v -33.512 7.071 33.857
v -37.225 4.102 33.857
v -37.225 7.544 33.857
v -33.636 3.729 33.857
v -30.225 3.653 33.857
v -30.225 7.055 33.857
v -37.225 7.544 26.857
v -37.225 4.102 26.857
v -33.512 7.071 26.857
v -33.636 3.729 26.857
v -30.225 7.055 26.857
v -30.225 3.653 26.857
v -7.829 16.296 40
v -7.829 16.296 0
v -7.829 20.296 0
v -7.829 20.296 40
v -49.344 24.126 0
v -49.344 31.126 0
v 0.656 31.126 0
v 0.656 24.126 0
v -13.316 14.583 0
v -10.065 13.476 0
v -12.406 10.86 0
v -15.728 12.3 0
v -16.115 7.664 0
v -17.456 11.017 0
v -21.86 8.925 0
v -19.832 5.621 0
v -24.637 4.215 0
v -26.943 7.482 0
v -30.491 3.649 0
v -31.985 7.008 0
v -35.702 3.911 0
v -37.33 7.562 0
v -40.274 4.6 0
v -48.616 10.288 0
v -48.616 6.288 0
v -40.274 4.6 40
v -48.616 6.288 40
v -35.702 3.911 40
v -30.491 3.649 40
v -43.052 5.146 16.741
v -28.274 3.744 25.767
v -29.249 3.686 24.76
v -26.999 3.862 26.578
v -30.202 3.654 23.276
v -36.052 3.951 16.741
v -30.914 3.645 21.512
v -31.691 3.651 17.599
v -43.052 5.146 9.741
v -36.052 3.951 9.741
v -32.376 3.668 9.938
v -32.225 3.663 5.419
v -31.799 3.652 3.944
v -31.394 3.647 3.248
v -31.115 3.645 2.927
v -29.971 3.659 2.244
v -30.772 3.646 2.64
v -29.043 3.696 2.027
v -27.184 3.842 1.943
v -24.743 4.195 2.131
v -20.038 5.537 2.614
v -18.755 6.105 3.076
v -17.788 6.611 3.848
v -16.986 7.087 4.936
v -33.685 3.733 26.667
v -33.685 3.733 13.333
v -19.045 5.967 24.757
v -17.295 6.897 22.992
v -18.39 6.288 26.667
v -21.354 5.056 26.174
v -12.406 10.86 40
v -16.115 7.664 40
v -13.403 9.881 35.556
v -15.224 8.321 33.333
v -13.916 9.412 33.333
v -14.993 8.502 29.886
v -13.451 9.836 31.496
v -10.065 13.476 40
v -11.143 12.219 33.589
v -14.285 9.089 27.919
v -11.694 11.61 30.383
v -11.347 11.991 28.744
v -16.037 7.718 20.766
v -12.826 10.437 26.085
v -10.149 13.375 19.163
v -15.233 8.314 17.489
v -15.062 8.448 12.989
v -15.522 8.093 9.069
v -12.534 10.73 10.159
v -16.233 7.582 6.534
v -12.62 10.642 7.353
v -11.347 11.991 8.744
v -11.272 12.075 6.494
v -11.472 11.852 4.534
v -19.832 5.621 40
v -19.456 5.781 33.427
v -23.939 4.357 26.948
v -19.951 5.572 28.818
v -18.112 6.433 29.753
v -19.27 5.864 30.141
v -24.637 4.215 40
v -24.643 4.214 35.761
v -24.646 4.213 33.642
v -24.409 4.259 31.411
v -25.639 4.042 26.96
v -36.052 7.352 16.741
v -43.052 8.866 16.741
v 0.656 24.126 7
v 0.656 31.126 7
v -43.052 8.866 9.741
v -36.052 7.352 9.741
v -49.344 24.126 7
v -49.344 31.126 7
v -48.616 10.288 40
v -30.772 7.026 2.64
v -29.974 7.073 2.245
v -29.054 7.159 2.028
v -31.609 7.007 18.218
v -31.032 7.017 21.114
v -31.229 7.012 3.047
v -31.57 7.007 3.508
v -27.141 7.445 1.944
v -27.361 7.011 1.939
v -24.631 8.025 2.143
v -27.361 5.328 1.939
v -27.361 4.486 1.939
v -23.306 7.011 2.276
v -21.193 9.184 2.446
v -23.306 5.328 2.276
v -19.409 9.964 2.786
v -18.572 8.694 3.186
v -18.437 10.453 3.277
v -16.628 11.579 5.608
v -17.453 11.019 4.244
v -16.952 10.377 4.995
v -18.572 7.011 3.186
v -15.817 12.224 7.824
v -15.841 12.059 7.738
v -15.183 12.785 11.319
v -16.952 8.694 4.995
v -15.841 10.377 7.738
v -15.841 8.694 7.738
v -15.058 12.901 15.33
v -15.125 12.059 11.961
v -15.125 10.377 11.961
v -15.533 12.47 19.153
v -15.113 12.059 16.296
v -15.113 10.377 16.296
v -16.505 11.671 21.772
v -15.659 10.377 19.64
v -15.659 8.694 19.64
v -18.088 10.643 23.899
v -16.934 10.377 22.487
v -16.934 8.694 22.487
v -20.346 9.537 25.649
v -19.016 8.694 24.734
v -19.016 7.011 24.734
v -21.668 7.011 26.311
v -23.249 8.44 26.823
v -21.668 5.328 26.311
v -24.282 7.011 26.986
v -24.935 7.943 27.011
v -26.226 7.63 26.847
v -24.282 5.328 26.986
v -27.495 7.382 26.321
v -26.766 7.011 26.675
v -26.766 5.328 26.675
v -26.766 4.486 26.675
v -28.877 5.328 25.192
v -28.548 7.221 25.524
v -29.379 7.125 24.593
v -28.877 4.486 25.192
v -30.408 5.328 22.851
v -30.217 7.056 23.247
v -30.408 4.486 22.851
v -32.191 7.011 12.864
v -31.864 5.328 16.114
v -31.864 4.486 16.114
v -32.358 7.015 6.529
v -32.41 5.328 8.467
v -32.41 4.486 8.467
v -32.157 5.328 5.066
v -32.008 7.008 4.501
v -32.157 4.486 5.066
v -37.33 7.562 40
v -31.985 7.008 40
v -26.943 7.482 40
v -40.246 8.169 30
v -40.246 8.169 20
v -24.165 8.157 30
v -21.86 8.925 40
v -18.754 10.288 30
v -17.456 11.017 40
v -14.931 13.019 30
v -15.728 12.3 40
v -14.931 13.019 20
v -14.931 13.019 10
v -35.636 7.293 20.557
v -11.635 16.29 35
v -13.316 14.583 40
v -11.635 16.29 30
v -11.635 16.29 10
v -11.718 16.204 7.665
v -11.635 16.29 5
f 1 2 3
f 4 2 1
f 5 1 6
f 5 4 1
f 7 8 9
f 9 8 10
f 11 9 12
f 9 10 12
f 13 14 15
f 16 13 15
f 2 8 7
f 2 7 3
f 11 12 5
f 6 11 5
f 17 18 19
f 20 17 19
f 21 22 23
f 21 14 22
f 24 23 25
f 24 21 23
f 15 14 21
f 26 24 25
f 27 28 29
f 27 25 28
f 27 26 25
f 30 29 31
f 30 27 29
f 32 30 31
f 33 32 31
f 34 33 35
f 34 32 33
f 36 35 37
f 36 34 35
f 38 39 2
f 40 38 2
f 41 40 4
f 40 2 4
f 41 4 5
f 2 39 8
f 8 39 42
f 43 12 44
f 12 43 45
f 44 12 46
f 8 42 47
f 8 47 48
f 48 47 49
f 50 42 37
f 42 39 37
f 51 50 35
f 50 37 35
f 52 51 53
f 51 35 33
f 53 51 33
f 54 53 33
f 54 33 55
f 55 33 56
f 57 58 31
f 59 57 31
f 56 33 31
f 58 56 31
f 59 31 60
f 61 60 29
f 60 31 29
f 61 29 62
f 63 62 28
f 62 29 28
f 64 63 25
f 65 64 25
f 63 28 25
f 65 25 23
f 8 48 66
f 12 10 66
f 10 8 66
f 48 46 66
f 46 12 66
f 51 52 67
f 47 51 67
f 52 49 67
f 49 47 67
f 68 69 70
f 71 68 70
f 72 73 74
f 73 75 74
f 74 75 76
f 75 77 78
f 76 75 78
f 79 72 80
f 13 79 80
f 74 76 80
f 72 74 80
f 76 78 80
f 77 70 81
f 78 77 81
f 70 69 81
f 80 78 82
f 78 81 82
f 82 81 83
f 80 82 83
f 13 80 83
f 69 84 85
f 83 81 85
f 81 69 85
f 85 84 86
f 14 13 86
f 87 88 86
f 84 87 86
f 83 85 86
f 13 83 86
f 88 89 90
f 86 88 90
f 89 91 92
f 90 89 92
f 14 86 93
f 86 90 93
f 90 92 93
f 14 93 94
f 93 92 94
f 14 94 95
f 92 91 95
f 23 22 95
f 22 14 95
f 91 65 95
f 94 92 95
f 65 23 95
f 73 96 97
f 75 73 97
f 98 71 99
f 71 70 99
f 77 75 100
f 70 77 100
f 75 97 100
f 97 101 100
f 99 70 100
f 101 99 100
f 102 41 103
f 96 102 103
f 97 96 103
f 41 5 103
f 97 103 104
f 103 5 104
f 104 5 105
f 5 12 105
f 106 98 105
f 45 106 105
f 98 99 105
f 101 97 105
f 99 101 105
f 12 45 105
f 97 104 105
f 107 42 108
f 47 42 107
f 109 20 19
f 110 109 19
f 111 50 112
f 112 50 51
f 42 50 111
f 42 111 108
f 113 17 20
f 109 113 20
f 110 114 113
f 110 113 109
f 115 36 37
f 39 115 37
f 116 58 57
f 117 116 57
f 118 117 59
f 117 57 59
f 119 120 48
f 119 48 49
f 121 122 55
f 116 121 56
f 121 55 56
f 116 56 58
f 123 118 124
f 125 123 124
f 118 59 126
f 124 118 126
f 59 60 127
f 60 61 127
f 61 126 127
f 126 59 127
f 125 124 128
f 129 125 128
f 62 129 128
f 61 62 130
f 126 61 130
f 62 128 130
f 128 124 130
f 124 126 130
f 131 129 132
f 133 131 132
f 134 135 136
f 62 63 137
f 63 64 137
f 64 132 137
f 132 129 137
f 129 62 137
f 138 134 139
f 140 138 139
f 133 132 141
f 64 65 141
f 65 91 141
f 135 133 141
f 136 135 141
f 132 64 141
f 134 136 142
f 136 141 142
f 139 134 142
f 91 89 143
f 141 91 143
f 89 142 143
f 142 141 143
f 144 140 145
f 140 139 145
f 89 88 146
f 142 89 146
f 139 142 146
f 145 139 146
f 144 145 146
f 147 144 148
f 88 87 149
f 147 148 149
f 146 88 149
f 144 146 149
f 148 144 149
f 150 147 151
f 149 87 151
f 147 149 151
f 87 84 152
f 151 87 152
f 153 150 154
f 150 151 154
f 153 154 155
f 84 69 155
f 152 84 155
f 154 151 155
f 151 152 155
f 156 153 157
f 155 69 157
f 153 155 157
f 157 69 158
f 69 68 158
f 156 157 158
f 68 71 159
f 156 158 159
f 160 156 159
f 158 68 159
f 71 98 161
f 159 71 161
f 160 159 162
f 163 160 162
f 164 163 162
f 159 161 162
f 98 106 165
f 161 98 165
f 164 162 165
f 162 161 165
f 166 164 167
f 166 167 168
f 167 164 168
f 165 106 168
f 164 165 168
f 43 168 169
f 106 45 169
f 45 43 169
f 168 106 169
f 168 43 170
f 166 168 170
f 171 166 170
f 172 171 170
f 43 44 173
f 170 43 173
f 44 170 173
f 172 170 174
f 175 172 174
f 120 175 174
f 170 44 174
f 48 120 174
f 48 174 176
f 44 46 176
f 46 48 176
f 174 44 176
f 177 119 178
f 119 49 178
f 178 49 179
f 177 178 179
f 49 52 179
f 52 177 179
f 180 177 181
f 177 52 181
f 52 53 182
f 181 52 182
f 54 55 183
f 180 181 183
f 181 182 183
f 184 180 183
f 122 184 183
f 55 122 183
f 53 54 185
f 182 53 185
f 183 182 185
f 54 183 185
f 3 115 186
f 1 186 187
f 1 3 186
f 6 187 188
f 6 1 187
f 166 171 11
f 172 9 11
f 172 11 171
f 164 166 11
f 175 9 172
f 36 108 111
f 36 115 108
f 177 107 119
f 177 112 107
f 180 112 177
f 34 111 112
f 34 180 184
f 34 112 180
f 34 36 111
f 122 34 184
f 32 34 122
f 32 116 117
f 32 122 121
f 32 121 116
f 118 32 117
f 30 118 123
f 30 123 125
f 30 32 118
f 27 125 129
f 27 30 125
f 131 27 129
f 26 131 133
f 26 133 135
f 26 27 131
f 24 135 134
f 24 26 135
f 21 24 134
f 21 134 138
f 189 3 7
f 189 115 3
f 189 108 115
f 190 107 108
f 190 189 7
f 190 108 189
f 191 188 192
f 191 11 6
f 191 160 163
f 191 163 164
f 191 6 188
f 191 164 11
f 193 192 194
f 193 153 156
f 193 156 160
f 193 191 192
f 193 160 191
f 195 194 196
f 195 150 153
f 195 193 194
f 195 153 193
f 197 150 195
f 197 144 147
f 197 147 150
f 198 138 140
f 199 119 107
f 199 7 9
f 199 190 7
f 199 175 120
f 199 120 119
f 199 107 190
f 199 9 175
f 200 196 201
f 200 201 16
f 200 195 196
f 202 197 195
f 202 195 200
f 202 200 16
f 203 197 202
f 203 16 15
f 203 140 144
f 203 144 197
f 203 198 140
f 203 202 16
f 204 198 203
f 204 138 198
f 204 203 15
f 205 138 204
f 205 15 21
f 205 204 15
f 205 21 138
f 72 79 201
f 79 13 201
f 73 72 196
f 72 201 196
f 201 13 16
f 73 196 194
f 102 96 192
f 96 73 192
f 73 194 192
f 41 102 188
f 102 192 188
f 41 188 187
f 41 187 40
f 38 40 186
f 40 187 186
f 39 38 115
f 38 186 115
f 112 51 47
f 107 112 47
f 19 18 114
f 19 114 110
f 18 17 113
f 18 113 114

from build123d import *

# Parameters (mm, degrees)
F1_DEPTH = 40
F2_W     = 7
F2_H     = 7
F3_DEPTH = 25
F4_W     = 50
F4_H     = 7
F5_DEPTH = 7


with BuildPart() as f1:
    # F0 (on Top) → F1 (new body)
    with BuildSketch(Plane.XY):
        with BuildLine():
            add(Edge.make_bspline(
                [(-48.6156083643, 10.2875726297), (-43.4733187348, 9.1108955617), (-31.8220733642, 5.0148085364), (-18.614967209, 9.9643111938), (-14.8732839652, 12.8618905652), (-10.3830992131, 17.5682967624), (-7.8294798732, 20.2962432951)],
                knots=[0, 0, 0, 0, 0.3189414643, 0.5928417153, 0.757615537, 1, 1, 1, 1], degree=3))
            Line((-48.6156083643, 10.2875726297), (-48.6156083643, 6.2875726297))
            add(Edge.make_bspline(
                [(-48.6156083643, 6.2875726297), (-43.7374007955, 5.3575686248), (-33.9718217418, 2.7711026196), (-17.3779863187, 4.6209908398), (-10.9349629168, 12.2356218457), (-7.8294798732, 16.2962432951)],
                knots=[0, 0, 0, 0, 0.3342407118, 0.6724197122, 1, 1, 1, 1], degree=3))
            Line((-7.8294798732, 16.2962432951), (-7.8294798732, 20.2962432951))
        make_face()
    extrude(amount=F1_DEPTH)

    # F2 (on Front) → F3 (cut)
    with BuildSketch(Plane.XZ):
        with Locations((-39.5520258546, 13.241329588)):
            Rectangle(F2_W, F2_H)
        with Locations((-33.7254334092, 30.356938377)):
            Rectangle(F2_W, F2_H)
        with BuildLine():
            add(Edge.make_bspline(
                [(-30.7716783136, 2.6401735377), (-29.1150607693, 1.4812871056), (-23.1764486473, 2.5063931272), (-18.1755364553, 2.3775081724), (-15.270305666, 7.8417375563), (-14.7275875267, 16.3004656814), (-16.2586119224, 22.7675075376), (-21.3867847503, 26.7696093394), (-27.0832678369, 27.5141677798), (-31.0674507155, 22.9228573012), (-31.9029228202, 15.9915029062), (-32.6135860351, 8.8729005432), (-32.2624557028, 3.6830465263), (-30.7716783136, 2.6401735377)],
                knots=[0, 0, 0, 0, 0.0991096339, 0.1787063751, 0.2622321665, 0.3684746851, 0.4605648585, 0.549994018, 0.6319531641, 0.7152569694, 0.8104329648, 0.9108120026, 1, 1, 1, 1], degree=3))
        make_face()
    extrude(amount=-F3_DEPTH, mode=Mode.SUBTRACT)


with BuildPart() as f5:
    # F4 (on Top) → F5 (new body)
    with BuildSketch(Plane.XY):
        with Locations((-24.34393242, 27.6257231683)):
            Rectangle(F4_W, F4_H)
    extrude(amount=F5_DEPTH)


solid = Compound([f1.part, f5.part])
